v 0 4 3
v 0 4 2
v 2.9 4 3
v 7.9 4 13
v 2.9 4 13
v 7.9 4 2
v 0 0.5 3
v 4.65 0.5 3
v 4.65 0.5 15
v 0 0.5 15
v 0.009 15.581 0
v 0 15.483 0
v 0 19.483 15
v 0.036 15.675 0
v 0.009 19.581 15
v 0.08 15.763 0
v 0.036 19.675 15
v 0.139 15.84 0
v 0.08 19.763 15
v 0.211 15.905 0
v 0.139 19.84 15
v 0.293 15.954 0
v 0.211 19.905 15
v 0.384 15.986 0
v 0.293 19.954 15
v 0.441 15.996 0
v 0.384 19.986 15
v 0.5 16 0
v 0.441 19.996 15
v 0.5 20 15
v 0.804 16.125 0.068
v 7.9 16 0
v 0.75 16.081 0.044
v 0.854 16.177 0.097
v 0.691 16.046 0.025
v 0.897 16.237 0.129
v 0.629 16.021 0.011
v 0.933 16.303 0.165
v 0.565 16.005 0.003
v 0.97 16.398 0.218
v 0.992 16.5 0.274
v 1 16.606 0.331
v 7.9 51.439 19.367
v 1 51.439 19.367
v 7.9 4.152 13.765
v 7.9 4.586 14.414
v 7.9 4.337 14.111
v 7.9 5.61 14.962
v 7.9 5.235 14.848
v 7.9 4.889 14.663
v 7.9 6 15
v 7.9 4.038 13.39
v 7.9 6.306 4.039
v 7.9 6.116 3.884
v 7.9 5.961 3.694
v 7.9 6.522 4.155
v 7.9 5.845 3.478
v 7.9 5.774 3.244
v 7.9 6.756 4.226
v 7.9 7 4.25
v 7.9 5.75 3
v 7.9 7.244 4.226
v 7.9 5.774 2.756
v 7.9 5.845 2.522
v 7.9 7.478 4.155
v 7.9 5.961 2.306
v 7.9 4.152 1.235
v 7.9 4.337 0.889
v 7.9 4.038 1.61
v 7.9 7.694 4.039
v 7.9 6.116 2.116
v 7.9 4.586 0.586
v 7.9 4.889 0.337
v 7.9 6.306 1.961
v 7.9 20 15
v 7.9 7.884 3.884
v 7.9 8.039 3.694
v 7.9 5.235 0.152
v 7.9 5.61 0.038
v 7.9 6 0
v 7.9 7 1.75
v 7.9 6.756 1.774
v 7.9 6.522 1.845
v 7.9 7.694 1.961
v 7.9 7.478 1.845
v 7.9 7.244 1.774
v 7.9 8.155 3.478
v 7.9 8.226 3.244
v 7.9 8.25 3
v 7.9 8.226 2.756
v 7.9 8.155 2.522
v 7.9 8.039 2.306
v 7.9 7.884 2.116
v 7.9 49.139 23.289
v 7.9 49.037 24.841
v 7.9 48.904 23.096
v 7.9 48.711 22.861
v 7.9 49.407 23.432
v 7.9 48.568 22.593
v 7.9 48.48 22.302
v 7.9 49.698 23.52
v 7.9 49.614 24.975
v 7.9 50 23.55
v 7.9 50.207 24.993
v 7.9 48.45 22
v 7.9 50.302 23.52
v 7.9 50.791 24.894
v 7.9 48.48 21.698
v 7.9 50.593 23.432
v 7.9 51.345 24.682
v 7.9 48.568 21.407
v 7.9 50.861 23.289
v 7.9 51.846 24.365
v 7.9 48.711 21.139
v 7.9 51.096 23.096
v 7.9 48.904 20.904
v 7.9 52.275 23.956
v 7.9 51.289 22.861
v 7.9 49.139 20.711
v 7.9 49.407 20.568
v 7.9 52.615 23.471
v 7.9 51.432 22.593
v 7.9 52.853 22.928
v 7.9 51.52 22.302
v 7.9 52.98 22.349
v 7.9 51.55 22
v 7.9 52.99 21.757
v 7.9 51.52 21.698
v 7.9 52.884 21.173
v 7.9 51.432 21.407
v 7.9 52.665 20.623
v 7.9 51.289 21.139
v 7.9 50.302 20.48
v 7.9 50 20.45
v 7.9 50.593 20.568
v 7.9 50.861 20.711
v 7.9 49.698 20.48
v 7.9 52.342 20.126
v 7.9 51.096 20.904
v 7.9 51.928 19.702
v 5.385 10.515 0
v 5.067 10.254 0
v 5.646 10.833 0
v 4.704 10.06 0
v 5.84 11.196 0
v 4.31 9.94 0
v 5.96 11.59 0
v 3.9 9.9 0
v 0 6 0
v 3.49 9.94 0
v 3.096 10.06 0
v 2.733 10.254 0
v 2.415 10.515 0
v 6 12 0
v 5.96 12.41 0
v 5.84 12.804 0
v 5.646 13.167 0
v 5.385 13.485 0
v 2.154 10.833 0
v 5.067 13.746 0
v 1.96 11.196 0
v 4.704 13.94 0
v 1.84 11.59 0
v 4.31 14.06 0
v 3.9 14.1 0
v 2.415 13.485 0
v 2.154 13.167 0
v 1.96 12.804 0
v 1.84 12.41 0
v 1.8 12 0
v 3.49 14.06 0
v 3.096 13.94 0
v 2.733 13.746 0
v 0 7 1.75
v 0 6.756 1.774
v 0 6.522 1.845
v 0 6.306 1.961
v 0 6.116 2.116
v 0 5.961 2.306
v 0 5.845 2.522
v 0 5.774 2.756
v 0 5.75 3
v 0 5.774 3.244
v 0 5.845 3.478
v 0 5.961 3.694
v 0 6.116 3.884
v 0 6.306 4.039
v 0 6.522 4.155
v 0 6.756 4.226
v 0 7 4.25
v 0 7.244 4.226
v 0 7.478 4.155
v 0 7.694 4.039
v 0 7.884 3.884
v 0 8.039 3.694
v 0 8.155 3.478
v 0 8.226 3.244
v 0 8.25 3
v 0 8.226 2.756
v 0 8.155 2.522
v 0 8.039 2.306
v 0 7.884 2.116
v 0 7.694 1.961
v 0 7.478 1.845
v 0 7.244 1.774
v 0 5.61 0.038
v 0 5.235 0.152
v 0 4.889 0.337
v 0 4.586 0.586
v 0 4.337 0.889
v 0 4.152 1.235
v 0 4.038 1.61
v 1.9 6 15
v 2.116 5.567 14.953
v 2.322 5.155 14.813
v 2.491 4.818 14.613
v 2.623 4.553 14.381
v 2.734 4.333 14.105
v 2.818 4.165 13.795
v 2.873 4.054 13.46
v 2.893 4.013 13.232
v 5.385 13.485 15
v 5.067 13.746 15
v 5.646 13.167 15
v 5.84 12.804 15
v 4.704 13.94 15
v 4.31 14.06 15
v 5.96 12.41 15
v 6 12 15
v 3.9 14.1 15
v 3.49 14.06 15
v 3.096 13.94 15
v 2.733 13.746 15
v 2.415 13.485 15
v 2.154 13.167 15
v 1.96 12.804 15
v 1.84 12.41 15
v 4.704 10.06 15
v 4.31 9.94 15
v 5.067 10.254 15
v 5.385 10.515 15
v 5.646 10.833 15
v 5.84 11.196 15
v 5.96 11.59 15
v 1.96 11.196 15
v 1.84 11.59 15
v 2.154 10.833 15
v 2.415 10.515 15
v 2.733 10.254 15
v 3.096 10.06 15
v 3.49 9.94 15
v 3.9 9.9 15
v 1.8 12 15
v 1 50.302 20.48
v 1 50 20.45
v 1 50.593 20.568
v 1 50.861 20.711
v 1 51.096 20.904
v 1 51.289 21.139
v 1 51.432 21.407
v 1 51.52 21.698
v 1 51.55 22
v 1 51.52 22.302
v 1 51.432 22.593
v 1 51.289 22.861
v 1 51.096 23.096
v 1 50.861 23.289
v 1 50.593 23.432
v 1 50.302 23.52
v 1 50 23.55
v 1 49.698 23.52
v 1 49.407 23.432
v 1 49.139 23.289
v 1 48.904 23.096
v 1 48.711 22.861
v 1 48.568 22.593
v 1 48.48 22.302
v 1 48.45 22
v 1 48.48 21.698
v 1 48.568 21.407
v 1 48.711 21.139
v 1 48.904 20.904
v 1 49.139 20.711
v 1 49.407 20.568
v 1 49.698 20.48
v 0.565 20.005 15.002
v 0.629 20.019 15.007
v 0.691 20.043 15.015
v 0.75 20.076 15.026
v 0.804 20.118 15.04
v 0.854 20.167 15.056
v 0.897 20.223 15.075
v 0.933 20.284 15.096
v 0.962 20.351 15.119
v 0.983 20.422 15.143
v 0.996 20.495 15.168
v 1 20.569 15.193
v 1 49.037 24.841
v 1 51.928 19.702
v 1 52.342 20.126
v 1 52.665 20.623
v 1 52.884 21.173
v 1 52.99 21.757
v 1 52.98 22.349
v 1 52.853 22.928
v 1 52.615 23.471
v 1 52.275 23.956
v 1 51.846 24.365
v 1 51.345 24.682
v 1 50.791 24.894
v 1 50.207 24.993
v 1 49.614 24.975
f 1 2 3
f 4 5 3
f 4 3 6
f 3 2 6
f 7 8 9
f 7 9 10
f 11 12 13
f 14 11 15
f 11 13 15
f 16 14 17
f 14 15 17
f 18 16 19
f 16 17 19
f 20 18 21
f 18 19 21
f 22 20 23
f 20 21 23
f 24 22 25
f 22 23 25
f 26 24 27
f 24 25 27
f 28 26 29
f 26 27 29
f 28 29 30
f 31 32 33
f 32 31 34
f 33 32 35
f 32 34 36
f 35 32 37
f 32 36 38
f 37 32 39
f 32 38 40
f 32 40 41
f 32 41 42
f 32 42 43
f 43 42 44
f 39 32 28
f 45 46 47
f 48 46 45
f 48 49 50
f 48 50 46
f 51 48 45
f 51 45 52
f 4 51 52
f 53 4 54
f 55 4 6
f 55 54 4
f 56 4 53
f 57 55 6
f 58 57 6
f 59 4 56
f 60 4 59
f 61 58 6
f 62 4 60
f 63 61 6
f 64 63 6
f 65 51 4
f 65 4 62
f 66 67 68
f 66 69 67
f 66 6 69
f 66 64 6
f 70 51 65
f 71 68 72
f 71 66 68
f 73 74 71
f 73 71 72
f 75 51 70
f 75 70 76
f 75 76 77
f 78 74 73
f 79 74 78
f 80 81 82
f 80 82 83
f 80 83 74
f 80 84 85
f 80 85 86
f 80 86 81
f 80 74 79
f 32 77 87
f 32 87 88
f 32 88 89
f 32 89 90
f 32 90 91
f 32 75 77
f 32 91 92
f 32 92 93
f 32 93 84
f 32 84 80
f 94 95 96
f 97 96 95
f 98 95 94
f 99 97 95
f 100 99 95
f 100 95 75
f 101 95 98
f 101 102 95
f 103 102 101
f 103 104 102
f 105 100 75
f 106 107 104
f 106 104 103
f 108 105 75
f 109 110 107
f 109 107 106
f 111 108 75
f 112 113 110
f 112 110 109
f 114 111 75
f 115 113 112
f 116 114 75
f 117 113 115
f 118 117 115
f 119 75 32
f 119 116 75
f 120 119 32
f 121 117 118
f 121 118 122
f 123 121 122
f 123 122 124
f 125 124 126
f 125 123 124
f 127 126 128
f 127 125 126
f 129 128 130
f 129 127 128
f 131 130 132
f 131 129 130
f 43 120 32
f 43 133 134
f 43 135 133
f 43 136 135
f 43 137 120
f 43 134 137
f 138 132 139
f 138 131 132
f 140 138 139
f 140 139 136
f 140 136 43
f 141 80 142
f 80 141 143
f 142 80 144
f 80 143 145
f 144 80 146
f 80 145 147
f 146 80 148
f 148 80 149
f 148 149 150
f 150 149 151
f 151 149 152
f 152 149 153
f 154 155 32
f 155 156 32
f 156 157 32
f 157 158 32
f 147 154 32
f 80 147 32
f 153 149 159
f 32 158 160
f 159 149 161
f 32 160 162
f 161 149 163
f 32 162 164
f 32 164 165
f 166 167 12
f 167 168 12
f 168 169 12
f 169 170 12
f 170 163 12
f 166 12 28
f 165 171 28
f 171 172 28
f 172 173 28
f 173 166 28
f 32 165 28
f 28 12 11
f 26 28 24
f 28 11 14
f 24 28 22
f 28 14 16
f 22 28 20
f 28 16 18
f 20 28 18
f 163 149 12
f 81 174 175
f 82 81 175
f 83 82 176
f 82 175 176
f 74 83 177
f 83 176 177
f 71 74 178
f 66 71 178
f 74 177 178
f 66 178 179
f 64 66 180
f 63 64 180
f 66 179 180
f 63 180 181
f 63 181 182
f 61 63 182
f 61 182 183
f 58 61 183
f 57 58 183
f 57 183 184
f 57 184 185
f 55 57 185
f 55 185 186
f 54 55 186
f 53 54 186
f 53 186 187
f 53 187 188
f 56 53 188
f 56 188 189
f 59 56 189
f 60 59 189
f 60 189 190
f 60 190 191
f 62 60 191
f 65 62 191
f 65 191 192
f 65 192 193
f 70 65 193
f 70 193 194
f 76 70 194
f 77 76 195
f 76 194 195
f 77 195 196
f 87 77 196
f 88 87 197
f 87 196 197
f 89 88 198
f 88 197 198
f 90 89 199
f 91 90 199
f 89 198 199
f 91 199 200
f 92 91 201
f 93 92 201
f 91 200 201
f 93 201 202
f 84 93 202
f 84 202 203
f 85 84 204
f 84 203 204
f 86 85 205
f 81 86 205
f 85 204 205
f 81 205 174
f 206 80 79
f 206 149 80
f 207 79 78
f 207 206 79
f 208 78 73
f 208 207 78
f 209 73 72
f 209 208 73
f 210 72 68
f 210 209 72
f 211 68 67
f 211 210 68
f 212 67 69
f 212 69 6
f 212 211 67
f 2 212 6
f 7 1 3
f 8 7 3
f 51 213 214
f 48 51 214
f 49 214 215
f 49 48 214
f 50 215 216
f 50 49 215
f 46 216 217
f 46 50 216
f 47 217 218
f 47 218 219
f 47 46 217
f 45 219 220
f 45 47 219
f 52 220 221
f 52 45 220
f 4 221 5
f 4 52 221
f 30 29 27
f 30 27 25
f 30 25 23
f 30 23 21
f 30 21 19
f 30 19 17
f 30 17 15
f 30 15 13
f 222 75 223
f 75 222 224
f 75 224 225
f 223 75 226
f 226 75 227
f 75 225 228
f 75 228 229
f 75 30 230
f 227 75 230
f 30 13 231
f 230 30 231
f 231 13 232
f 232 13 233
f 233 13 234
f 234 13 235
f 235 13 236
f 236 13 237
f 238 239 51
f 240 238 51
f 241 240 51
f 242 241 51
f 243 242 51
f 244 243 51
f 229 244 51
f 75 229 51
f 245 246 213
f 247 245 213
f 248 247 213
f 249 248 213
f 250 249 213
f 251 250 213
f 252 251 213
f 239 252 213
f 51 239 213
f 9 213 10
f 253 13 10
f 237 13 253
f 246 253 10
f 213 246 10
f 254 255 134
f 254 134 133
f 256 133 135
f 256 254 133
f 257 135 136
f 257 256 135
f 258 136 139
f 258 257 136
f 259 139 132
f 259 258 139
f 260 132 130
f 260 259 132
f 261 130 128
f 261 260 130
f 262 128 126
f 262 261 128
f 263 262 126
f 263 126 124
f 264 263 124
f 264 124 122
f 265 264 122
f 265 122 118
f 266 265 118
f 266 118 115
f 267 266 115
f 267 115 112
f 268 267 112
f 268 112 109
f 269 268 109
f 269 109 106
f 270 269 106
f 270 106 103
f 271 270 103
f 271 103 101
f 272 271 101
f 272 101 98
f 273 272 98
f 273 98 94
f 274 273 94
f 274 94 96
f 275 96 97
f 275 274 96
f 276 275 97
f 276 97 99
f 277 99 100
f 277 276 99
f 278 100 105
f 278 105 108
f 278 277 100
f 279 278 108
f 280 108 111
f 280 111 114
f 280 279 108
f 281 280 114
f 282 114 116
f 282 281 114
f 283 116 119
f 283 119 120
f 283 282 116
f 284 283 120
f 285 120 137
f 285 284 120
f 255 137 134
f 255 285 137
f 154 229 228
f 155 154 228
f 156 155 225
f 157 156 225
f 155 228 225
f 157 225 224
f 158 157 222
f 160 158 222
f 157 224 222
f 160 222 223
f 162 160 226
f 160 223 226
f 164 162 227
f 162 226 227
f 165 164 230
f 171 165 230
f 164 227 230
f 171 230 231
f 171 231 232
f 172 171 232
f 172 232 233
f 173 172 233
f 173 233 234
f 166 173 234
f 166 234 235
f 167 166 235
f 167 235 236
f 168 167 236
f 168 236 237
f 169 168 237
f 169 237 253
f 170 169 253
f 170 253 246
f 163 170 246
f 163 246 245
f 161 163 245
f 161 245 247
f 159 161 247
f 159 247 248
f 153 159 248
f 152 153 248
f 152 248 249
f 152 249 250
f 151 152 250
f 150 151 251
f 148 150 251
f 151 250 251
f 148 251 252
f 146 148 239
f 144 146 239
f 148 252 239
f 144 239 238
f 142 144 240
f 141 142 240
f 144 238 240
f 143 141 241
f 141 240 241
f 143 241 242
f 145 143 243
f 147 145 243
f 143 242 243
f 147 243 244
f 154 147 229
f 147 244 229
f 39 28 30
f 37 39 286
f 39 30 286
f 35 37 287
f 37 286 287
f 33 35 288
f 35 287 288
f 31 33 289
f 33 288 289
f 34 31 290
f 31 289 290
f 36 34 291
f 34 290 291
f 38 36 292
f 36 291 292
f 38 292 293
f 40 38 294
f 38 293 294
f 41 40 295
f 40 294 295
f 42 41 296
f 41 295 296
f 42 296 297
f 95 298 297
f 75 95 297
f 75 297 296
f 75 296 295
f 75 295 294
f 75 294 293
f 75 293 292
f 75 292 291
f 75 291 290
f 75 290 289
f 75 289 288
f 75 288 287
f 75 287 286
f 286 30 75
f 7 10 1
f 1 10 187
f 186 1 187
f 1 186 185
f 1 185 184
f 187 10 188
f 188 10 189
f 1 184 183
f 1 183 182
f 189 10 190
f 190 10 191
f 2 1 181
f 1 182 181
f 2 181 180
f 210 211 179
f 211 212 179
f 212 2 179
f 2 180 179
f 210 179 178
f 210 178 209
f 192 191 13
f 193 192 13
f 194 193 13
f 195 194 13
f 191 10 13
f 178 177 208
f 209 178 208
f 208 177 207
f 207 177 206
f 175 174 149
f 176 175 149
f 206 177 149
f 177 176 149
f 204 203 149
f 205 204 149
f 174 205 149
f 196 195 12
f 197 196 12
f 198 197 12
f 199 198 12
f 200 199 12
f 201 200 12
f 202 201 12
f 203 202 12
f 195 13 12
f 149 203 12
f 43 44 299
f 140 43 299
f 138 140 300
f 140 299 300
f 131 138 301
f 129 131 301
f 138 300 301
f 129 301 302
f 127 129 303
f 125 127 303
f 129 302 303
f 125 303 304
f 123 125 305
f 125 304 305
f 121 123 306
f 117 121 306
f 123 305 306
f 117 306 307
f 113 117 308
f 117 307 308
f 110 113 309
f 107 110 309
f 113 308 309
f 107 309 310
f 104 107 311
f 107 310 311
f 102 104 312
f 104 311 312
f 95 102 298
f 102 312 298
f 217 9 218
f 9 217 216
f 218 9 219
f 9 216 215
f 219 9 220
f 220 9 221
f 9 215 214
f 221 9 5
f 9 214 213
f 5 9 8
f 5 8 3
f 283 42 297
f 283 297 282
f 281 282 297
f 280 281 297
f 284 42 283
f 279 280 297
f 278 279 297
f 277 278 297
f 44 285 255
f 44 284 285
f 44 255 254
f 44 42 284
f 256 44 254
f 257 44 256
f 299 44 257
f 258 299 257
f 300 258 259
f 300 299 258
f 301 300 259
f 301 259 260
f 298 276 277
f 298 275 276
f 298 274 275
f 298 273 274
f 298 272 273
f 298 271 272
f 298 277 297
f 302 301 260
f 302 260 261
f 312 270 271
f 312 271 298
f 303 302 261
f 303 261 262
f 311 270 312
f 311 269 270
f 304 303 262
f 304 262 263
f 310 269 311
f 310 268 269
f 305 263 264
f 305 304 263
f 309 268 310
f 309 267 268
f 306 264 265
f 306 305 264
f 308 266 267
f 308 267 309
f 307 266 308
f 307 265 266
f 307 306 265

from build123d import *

# Parameters (mm, degrees)
SKETCH1_R             = 1.55
BOSS_EXTRUDE1_DEPTH   = 7.9
CUT_EXTRUDE2_DEPTH    = 60.130449009
M3X0_5_TAPPED_HOLE1_D = 2.5
SKETCH7_W             = 8
SKETCH7_H             = 0.5
CUT_EXTRUDE3_DEPTH    = 60.130449009
SKETCH8_R             = 2.1
CUT_EXTRUDE4_DEPTH    = 56.645395137
CUT_EXTRUDE5_DEPTH    = 3
CUT_EXTRUDE6_DEPTH    = 1
FILLET4_R             = 0.5
FILLET5_R             = 2


with BuildPart() as part:
    # Sketch1 → Boss-Extrude1 (new body)
    with BuildSketch(Plane(origin=(0, 0, 0), x_dir=(0, 0, -1), z_dir=(1, 0, 0))):
        with BuildLine():
            Line((0, 0), (0, 16))
            Line((0, 16), (-19.367478425, 51.438690431))
            ThreePointArc((-19.367478425, 51.438690431), (-23.205351274, 52.747203725), (-24.84125158, 49.037041298))
            Line((-24.84125158, 49.037041298), (-15, 20))
            Line((-15, 20), (-15, 0))
            Line((-15, 0), (0, 0))
        make_face()
        with Locations((-22, 50)):
            Circle(SKETCH1_R, mode=Mode.SUBTRACT)
    extrude(amount=BOSS_EXTRUDE1_DEPTH)

    # Sketch3 → Cut-Extrude2 (cut, through all)
    with BuildSketch(Plane(origin=(0, 0, 0), x_dir=(-1, 0, 0), z_dir=(0, 0, -1))):
        Polygon((-7.9, 0), (-4.9, 0), (-2.9, 4), (-7.9, 4), align=None)
    extrude(amount=-CUT_EXTRUDE2_DEPTH, mode=Mode.SUBTRACT)

    # M3x0.5 Tapped Hole1 (through all)
    with Locations(Plane(origin=(7.9, 7, 3), x_dir=(0, 0, 1), z_dir=(1, 0, 0))):
        with Locations((0, 0)):
            Hole(M3X0_5_TAPPED_HOLE1_D / 2)

    # Sketch7 → Cut-Extrude3 (cut, through all)
    with BuildSketch(Plane(origin=(0, 0, 0), x_dir=(-1, 0, 0), z_dir=(0, 0, -1))):
        with Locations((-4, 0.25)):
            Rectangle(SKETCH7_W, SKETCH7_H)
    extrude(amount=-CUT_EXTRUDE3_DEPTH, mode=Mode.SUBTRACT)

    # Sketch8 → Cut-Extrude4 (cut, through all)
    with BuildSketch(Plane.XY.offset(15)):
        with Locations((3.9, 12)):
            Circle(SKETCH8_R)
    extrude(amount=-CUT_EXTRUDE4_DEPTH, mode=Mode.SUBTRACT)

    # Sketch9 → Cut-Extrude5 (cut)
    with BuildSketch(Plane(origin=(0, 0, 0), x_dir=(-1, 0, 0), z_dir=(0, 0, -1))):
        Polygon((-4.65, 0.5), (-2.9, 4), (0, 4), (0, 0.5), align=None)
    extrude(amount=-CUT_EXTRUDE5_DEPTH, mode=Mode.SUBTRACT)

    # Sketch11 → Cut-Extrude6 (cut)
    with BuildSketch(Plane.ZY):
        with BuildLine():
            Line((0, 16), (15, 20))
            Line((15, 20), (24.84125158, 49.037041298))
            ThreePointArc((24.84125158, 49.037041298), (23.205351274, 52.747203725), (19.367478425, 51.438690431))
            Line((19.367478425, 51.438690431), (0, 16))
        make_face()
    extrude(amount=-CUT_EXTRUDE6_DEPTH, mode=Mode.SUBTRACT)

    # Fillet4
    fillet4_edges = [part.edges().sort_by_distance(p)[0] for p in [
        (1, 18, 7.5),
        (0, 18, 7.5),
    ]]
    fillet(fillet4_edges, radius=FILLET4_R - 0.0001)  # a hair under: the kernel refuses the full size

    # Fillet5
    fillet5_edges = [part.edges().sort_by_distance(p)[0] for p in [
        (5.4, 4, 15),
        (3.95, 4, 0),
    ]]
    fillet(fillet5_edges, radius=FILLET5_R)


solid = part.part
